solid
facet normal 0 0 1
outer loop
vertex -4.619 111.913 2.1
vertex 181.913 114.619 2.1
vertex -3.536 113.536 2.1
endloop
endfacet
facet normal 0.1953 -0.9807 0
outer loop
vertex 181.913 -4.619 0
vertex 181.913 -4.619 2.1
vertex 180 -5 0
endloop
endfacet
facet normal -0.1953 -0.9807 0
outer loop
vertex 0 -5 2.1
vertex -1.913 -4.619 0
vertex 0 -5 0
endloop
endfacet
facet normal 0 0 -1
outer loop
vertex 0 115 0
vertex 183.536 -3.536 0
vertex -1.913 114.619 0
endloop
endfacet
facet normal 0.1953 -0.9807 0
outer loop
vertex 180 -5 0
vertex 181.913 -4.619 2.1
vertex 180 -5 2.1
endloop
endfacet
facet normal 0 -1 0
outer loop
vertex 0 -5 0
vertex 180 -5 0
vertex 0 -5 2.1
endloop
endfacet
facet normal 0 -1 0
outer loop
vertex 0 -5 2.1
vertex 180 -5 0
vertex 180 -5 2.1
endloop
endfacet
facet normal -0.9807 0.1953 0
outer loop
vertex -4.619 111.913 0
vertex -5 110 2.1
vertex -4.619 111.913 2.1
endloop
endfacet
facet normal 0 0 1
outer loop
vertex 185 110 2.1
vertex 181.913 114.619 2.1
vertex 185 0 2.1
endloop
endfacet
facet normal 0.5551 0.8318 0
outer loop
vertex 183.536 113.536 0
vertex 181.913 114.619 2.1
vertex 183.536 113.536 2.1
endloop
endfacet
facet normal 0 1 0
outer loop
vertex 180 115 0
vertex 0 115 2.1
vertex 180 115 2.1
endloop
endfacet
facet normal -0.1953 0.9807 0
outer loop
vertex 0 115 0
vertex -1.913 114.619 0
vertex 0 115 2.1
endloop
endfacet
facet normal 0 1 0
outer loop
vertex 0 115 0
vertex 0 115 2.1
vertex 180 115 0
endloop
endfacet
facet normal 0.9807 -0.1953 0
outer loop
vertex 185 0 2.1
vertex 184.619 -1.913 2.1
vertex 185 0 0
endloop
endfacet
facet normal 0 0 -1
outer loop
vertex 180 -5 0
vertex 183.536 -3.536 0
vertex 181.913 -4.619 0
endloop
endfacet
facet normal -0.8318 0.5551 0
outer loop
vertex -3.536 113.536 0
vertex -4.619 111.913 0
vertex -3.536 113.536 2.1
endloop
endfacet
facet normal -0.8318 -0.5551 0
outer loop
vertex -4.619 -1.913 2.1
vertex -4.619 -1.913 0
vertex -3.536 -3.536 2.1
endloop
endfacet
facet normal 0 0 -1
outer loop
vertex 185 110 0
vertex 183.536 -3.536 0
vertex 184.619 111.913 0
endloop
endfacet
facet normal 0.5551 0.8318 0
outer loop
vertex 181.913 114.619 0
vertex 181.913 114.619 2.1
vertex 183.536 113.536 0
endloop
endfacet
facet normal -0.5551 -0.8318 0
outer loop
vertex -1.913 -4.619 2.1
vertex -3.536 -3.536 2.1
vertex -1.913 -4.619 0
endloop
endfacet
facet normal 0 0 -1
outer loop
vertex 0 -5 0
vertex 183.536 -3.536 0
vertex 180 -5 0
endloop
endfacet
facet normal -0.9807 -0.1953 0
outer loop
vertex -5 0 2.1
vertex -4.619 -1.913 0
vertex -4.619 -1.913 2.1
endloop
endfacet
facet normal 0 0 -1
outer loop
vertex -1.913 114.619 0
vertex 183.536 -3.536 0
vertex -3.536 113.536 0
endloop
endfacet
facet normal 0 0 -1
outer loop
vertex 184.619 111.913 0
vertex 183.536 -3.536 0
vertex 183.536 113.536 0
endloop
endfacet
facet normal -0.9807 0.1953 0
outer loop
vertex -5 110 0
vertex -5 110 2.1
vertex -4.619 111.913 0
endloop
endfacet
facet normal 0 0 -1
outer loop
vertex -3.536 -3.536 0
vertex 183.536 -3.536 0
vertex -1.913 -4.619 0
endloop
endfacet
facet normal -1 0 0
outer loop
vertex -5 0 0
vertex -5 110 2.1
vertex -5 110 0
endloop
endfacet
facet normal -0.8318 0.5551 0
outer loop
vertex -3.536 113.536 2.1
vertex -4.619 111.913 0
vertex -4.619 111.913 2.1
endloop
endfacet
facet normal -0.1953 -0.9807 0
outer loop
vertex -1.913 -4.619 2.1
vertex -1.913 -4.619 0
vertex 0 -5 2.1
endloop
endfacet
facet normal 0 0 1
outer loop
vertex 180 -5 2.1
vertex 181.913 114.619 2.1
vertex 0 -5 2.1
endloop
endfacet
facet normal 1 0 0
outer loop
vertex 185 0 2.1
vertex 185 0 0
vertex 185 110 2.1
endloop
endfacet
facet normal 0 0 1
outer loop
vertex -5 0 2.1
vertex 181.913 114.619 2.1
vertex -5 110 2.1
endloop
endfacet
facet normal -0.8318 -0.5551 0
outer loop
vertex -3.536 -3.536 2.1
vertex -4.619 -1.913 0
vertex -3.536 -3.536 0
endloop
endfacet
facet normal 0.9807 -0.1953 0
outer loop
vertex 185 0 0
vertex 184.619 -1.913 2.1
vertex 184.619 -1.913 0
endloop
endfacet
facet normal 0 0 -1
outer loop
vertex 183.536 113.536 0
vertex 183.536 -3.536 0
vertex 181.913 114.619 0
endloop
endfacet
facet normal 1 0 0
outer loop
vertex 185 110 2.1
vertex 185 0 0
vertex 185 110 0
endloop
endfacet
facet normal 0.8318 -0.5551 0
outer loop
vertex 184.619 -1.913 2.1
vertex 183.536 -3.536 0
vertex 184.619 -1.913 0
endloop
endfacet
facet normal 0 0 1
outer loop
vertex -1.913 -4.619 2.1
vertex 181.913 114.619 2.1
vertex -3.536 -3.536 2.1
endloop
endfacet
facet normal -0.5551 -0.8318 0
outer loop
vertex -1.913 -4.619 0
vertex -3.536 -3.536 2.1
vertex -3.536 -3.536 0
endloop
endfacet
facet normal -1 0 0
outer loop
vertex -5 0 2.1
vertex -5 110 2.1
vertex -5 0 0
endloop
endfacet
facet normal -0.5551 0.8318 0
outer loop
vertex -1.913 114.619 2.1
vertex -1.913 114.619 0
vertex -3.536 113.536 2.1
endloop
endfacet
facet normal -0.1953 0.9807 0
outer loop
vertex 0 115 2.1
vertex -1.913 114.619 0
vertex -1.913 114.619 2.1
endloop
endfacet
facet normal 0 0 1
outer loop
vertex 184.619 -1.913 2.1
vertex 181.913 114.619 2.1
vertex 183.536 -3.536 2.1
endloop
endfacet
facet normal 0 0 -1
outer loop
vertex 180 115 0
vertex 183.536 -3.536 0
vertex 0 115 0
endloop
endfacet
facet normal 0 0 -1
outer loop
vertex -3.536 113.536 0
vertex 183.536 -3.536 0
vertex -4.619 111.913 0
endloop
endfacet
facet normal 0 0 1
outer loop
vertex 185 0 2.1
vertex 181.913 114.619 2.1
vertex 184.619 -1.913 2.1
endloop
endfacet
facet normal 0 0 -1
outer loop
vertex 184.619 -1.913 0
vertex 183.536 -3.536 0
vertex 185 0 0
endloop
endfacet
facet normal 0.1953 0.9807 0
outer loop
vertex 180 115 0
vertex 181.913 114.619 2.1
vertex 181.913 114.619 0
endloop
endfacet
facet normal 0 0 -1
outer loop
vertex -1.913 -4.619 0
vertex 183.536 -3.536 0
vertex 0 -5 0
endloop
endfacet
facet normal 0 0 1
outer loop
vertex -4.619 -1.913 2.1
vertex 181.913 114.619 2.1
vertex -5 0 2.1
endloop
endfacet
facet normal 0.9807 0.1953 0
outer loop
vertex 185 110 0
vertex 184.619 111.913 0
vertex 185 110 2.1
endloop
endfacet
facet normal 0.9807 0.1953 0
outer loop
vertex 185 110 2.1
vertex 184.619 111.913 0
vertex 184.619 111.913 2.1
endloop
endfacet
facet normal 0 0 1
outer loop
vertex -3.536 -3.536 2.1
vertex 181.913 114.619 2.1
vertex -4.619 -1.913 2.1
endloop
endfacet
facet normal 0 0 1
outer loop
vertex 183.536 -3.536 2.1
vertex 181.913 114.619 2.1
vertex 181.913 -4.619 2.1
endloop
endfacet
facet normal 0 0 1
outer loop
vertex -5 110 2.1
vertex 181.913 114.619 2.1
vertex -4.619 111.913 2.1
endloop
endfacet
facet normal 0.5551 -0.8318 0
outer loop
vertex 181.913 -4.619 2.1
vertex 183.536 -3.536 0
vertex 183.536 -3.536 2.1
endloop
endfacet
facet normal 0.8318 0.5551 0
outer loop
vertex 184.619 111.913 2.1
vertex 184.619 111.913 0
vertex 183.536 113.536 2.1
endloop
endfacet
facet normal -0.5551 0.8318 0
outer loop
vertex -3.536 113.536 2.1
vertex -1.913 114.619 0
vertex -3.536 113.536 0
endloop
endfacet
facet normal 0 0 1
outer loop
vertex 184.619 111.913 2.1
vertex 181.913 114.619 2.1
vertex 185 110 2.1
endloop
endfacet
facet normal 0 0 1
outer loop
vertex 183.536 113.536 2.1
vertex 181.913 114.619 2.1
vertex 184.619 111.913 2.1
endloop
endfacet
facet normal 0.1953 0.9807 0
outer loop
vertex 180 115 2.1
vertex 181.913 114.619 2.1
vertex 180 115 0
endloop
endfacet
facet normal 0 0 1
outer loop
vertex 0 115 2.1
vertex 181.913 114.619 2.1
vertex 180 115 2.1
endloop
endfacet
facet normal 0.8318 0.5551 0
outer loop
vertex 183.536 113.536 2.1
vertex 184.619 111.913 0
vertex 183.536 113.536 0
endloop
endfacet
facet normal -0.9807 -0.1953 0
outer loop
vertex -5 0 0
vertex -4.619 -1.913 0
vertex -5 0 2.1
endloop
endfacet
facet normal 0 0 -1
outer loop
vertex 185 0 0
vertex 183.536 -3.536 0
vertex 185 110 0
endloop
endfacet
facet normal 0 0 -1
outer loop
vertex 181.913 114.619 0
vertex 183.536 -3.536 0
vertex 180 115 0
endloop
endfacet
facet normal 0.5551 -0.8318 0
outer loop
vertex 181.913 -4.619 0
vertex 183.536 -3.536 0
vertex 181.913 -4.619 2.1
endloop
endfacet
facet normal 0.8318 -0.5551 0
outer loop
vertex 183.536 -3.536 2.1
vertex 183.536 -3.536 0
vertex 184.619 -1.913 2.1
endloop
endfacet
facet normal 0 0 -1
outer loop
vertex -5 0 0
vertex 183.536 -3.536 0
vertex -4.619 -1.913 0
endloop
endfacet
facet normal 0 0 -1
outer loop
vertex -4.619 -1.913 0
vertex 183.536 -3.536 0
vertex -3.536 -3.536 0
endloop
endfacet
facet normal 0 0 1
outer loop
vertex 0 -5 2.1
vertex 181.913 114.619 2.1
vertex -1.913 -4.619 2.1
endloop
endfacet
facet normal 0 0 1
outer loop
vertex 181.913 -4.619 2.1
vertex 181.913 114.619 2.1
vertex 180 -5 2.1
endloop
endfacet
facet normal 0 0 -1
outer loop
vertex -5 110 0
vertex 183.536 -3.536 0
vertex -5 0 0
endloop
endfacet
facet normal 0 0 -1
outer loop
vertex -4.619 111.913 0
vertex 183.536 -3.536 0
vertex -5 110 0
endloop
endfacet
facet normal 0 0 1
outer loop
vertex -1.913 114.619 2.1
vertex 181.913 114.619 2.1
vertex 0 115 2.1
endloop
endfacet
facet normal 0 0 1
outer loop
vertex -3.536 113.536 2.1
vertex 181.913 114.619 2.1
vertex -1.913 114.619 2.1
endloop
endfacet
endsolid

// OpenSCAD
pocet_der1=15;
pocet_der2=11;
polomer=5;
vzdalenost_der=10.16;


module plbase(){

minkowski()
    {
	cube([180,110,2]);          // base plastics brick
        cylinder(r=5,h=0.1);
    }


}

plbase();











/*

pedestal_height = 2;   // designed for use the MLAB standard 12mm screws.
mount_hole = 3.5;
clear = 0.175;

MLAB_grid_xoffset = 3.88;
MLAB_grid_yoffset = 4.2;
MLAB_grid = 10.16;

legs_height = 5;

$fn=20;
















module leg () {
    difference () {
        cylinder(r=MLAB_grid/2 + 0.3,h=legs_height);
        cylinder(r=MLAB_grid/2 - 0.3,h=legs_height);
    }
}

difference () {
    minkowski()
    {
	cube([150,110,pedestal_height]);          // base plastics brick
        cylinder(r=5,h=0.1);
    }
    // MLAB grid holes
    grid_list = [for (j = [MLAB_grid_xoffset : MLAB_grid: 150], i = [MLAB_grid_yoffset :MLAB_grid: 110]) [j, i] ];
    for (j = grid_list) {
            translate (concat(j, [0]))
            cylinder (h = 2*pedestal_height, r= mount_hole/2);
    }
}

translate ([MLAB_grid_xoffset, MLAB_grid_yoffset, 2])
leg(); 

translate ([MLAB_grid_xoffset + 14*MLAB_grid, MLAB_grid_yoffset, 2])
leg(); 

translate ([MLAB_grid_xoffset + 14*MLAB_grid, MLAB_grid_yoffset + 10*MLAB_grid, 2])
leg(); 

translate ([MLAB_grid_xoffset + 7*MLAB_grid, MLAB_grid_yoffset + 5*MLAB_grid, 2])
leg(); 

translate ([MLAB_grid_xoffset, MLAB_grid_yoffset + 10*MLAB_grid, 2])
leg(); 
*/
